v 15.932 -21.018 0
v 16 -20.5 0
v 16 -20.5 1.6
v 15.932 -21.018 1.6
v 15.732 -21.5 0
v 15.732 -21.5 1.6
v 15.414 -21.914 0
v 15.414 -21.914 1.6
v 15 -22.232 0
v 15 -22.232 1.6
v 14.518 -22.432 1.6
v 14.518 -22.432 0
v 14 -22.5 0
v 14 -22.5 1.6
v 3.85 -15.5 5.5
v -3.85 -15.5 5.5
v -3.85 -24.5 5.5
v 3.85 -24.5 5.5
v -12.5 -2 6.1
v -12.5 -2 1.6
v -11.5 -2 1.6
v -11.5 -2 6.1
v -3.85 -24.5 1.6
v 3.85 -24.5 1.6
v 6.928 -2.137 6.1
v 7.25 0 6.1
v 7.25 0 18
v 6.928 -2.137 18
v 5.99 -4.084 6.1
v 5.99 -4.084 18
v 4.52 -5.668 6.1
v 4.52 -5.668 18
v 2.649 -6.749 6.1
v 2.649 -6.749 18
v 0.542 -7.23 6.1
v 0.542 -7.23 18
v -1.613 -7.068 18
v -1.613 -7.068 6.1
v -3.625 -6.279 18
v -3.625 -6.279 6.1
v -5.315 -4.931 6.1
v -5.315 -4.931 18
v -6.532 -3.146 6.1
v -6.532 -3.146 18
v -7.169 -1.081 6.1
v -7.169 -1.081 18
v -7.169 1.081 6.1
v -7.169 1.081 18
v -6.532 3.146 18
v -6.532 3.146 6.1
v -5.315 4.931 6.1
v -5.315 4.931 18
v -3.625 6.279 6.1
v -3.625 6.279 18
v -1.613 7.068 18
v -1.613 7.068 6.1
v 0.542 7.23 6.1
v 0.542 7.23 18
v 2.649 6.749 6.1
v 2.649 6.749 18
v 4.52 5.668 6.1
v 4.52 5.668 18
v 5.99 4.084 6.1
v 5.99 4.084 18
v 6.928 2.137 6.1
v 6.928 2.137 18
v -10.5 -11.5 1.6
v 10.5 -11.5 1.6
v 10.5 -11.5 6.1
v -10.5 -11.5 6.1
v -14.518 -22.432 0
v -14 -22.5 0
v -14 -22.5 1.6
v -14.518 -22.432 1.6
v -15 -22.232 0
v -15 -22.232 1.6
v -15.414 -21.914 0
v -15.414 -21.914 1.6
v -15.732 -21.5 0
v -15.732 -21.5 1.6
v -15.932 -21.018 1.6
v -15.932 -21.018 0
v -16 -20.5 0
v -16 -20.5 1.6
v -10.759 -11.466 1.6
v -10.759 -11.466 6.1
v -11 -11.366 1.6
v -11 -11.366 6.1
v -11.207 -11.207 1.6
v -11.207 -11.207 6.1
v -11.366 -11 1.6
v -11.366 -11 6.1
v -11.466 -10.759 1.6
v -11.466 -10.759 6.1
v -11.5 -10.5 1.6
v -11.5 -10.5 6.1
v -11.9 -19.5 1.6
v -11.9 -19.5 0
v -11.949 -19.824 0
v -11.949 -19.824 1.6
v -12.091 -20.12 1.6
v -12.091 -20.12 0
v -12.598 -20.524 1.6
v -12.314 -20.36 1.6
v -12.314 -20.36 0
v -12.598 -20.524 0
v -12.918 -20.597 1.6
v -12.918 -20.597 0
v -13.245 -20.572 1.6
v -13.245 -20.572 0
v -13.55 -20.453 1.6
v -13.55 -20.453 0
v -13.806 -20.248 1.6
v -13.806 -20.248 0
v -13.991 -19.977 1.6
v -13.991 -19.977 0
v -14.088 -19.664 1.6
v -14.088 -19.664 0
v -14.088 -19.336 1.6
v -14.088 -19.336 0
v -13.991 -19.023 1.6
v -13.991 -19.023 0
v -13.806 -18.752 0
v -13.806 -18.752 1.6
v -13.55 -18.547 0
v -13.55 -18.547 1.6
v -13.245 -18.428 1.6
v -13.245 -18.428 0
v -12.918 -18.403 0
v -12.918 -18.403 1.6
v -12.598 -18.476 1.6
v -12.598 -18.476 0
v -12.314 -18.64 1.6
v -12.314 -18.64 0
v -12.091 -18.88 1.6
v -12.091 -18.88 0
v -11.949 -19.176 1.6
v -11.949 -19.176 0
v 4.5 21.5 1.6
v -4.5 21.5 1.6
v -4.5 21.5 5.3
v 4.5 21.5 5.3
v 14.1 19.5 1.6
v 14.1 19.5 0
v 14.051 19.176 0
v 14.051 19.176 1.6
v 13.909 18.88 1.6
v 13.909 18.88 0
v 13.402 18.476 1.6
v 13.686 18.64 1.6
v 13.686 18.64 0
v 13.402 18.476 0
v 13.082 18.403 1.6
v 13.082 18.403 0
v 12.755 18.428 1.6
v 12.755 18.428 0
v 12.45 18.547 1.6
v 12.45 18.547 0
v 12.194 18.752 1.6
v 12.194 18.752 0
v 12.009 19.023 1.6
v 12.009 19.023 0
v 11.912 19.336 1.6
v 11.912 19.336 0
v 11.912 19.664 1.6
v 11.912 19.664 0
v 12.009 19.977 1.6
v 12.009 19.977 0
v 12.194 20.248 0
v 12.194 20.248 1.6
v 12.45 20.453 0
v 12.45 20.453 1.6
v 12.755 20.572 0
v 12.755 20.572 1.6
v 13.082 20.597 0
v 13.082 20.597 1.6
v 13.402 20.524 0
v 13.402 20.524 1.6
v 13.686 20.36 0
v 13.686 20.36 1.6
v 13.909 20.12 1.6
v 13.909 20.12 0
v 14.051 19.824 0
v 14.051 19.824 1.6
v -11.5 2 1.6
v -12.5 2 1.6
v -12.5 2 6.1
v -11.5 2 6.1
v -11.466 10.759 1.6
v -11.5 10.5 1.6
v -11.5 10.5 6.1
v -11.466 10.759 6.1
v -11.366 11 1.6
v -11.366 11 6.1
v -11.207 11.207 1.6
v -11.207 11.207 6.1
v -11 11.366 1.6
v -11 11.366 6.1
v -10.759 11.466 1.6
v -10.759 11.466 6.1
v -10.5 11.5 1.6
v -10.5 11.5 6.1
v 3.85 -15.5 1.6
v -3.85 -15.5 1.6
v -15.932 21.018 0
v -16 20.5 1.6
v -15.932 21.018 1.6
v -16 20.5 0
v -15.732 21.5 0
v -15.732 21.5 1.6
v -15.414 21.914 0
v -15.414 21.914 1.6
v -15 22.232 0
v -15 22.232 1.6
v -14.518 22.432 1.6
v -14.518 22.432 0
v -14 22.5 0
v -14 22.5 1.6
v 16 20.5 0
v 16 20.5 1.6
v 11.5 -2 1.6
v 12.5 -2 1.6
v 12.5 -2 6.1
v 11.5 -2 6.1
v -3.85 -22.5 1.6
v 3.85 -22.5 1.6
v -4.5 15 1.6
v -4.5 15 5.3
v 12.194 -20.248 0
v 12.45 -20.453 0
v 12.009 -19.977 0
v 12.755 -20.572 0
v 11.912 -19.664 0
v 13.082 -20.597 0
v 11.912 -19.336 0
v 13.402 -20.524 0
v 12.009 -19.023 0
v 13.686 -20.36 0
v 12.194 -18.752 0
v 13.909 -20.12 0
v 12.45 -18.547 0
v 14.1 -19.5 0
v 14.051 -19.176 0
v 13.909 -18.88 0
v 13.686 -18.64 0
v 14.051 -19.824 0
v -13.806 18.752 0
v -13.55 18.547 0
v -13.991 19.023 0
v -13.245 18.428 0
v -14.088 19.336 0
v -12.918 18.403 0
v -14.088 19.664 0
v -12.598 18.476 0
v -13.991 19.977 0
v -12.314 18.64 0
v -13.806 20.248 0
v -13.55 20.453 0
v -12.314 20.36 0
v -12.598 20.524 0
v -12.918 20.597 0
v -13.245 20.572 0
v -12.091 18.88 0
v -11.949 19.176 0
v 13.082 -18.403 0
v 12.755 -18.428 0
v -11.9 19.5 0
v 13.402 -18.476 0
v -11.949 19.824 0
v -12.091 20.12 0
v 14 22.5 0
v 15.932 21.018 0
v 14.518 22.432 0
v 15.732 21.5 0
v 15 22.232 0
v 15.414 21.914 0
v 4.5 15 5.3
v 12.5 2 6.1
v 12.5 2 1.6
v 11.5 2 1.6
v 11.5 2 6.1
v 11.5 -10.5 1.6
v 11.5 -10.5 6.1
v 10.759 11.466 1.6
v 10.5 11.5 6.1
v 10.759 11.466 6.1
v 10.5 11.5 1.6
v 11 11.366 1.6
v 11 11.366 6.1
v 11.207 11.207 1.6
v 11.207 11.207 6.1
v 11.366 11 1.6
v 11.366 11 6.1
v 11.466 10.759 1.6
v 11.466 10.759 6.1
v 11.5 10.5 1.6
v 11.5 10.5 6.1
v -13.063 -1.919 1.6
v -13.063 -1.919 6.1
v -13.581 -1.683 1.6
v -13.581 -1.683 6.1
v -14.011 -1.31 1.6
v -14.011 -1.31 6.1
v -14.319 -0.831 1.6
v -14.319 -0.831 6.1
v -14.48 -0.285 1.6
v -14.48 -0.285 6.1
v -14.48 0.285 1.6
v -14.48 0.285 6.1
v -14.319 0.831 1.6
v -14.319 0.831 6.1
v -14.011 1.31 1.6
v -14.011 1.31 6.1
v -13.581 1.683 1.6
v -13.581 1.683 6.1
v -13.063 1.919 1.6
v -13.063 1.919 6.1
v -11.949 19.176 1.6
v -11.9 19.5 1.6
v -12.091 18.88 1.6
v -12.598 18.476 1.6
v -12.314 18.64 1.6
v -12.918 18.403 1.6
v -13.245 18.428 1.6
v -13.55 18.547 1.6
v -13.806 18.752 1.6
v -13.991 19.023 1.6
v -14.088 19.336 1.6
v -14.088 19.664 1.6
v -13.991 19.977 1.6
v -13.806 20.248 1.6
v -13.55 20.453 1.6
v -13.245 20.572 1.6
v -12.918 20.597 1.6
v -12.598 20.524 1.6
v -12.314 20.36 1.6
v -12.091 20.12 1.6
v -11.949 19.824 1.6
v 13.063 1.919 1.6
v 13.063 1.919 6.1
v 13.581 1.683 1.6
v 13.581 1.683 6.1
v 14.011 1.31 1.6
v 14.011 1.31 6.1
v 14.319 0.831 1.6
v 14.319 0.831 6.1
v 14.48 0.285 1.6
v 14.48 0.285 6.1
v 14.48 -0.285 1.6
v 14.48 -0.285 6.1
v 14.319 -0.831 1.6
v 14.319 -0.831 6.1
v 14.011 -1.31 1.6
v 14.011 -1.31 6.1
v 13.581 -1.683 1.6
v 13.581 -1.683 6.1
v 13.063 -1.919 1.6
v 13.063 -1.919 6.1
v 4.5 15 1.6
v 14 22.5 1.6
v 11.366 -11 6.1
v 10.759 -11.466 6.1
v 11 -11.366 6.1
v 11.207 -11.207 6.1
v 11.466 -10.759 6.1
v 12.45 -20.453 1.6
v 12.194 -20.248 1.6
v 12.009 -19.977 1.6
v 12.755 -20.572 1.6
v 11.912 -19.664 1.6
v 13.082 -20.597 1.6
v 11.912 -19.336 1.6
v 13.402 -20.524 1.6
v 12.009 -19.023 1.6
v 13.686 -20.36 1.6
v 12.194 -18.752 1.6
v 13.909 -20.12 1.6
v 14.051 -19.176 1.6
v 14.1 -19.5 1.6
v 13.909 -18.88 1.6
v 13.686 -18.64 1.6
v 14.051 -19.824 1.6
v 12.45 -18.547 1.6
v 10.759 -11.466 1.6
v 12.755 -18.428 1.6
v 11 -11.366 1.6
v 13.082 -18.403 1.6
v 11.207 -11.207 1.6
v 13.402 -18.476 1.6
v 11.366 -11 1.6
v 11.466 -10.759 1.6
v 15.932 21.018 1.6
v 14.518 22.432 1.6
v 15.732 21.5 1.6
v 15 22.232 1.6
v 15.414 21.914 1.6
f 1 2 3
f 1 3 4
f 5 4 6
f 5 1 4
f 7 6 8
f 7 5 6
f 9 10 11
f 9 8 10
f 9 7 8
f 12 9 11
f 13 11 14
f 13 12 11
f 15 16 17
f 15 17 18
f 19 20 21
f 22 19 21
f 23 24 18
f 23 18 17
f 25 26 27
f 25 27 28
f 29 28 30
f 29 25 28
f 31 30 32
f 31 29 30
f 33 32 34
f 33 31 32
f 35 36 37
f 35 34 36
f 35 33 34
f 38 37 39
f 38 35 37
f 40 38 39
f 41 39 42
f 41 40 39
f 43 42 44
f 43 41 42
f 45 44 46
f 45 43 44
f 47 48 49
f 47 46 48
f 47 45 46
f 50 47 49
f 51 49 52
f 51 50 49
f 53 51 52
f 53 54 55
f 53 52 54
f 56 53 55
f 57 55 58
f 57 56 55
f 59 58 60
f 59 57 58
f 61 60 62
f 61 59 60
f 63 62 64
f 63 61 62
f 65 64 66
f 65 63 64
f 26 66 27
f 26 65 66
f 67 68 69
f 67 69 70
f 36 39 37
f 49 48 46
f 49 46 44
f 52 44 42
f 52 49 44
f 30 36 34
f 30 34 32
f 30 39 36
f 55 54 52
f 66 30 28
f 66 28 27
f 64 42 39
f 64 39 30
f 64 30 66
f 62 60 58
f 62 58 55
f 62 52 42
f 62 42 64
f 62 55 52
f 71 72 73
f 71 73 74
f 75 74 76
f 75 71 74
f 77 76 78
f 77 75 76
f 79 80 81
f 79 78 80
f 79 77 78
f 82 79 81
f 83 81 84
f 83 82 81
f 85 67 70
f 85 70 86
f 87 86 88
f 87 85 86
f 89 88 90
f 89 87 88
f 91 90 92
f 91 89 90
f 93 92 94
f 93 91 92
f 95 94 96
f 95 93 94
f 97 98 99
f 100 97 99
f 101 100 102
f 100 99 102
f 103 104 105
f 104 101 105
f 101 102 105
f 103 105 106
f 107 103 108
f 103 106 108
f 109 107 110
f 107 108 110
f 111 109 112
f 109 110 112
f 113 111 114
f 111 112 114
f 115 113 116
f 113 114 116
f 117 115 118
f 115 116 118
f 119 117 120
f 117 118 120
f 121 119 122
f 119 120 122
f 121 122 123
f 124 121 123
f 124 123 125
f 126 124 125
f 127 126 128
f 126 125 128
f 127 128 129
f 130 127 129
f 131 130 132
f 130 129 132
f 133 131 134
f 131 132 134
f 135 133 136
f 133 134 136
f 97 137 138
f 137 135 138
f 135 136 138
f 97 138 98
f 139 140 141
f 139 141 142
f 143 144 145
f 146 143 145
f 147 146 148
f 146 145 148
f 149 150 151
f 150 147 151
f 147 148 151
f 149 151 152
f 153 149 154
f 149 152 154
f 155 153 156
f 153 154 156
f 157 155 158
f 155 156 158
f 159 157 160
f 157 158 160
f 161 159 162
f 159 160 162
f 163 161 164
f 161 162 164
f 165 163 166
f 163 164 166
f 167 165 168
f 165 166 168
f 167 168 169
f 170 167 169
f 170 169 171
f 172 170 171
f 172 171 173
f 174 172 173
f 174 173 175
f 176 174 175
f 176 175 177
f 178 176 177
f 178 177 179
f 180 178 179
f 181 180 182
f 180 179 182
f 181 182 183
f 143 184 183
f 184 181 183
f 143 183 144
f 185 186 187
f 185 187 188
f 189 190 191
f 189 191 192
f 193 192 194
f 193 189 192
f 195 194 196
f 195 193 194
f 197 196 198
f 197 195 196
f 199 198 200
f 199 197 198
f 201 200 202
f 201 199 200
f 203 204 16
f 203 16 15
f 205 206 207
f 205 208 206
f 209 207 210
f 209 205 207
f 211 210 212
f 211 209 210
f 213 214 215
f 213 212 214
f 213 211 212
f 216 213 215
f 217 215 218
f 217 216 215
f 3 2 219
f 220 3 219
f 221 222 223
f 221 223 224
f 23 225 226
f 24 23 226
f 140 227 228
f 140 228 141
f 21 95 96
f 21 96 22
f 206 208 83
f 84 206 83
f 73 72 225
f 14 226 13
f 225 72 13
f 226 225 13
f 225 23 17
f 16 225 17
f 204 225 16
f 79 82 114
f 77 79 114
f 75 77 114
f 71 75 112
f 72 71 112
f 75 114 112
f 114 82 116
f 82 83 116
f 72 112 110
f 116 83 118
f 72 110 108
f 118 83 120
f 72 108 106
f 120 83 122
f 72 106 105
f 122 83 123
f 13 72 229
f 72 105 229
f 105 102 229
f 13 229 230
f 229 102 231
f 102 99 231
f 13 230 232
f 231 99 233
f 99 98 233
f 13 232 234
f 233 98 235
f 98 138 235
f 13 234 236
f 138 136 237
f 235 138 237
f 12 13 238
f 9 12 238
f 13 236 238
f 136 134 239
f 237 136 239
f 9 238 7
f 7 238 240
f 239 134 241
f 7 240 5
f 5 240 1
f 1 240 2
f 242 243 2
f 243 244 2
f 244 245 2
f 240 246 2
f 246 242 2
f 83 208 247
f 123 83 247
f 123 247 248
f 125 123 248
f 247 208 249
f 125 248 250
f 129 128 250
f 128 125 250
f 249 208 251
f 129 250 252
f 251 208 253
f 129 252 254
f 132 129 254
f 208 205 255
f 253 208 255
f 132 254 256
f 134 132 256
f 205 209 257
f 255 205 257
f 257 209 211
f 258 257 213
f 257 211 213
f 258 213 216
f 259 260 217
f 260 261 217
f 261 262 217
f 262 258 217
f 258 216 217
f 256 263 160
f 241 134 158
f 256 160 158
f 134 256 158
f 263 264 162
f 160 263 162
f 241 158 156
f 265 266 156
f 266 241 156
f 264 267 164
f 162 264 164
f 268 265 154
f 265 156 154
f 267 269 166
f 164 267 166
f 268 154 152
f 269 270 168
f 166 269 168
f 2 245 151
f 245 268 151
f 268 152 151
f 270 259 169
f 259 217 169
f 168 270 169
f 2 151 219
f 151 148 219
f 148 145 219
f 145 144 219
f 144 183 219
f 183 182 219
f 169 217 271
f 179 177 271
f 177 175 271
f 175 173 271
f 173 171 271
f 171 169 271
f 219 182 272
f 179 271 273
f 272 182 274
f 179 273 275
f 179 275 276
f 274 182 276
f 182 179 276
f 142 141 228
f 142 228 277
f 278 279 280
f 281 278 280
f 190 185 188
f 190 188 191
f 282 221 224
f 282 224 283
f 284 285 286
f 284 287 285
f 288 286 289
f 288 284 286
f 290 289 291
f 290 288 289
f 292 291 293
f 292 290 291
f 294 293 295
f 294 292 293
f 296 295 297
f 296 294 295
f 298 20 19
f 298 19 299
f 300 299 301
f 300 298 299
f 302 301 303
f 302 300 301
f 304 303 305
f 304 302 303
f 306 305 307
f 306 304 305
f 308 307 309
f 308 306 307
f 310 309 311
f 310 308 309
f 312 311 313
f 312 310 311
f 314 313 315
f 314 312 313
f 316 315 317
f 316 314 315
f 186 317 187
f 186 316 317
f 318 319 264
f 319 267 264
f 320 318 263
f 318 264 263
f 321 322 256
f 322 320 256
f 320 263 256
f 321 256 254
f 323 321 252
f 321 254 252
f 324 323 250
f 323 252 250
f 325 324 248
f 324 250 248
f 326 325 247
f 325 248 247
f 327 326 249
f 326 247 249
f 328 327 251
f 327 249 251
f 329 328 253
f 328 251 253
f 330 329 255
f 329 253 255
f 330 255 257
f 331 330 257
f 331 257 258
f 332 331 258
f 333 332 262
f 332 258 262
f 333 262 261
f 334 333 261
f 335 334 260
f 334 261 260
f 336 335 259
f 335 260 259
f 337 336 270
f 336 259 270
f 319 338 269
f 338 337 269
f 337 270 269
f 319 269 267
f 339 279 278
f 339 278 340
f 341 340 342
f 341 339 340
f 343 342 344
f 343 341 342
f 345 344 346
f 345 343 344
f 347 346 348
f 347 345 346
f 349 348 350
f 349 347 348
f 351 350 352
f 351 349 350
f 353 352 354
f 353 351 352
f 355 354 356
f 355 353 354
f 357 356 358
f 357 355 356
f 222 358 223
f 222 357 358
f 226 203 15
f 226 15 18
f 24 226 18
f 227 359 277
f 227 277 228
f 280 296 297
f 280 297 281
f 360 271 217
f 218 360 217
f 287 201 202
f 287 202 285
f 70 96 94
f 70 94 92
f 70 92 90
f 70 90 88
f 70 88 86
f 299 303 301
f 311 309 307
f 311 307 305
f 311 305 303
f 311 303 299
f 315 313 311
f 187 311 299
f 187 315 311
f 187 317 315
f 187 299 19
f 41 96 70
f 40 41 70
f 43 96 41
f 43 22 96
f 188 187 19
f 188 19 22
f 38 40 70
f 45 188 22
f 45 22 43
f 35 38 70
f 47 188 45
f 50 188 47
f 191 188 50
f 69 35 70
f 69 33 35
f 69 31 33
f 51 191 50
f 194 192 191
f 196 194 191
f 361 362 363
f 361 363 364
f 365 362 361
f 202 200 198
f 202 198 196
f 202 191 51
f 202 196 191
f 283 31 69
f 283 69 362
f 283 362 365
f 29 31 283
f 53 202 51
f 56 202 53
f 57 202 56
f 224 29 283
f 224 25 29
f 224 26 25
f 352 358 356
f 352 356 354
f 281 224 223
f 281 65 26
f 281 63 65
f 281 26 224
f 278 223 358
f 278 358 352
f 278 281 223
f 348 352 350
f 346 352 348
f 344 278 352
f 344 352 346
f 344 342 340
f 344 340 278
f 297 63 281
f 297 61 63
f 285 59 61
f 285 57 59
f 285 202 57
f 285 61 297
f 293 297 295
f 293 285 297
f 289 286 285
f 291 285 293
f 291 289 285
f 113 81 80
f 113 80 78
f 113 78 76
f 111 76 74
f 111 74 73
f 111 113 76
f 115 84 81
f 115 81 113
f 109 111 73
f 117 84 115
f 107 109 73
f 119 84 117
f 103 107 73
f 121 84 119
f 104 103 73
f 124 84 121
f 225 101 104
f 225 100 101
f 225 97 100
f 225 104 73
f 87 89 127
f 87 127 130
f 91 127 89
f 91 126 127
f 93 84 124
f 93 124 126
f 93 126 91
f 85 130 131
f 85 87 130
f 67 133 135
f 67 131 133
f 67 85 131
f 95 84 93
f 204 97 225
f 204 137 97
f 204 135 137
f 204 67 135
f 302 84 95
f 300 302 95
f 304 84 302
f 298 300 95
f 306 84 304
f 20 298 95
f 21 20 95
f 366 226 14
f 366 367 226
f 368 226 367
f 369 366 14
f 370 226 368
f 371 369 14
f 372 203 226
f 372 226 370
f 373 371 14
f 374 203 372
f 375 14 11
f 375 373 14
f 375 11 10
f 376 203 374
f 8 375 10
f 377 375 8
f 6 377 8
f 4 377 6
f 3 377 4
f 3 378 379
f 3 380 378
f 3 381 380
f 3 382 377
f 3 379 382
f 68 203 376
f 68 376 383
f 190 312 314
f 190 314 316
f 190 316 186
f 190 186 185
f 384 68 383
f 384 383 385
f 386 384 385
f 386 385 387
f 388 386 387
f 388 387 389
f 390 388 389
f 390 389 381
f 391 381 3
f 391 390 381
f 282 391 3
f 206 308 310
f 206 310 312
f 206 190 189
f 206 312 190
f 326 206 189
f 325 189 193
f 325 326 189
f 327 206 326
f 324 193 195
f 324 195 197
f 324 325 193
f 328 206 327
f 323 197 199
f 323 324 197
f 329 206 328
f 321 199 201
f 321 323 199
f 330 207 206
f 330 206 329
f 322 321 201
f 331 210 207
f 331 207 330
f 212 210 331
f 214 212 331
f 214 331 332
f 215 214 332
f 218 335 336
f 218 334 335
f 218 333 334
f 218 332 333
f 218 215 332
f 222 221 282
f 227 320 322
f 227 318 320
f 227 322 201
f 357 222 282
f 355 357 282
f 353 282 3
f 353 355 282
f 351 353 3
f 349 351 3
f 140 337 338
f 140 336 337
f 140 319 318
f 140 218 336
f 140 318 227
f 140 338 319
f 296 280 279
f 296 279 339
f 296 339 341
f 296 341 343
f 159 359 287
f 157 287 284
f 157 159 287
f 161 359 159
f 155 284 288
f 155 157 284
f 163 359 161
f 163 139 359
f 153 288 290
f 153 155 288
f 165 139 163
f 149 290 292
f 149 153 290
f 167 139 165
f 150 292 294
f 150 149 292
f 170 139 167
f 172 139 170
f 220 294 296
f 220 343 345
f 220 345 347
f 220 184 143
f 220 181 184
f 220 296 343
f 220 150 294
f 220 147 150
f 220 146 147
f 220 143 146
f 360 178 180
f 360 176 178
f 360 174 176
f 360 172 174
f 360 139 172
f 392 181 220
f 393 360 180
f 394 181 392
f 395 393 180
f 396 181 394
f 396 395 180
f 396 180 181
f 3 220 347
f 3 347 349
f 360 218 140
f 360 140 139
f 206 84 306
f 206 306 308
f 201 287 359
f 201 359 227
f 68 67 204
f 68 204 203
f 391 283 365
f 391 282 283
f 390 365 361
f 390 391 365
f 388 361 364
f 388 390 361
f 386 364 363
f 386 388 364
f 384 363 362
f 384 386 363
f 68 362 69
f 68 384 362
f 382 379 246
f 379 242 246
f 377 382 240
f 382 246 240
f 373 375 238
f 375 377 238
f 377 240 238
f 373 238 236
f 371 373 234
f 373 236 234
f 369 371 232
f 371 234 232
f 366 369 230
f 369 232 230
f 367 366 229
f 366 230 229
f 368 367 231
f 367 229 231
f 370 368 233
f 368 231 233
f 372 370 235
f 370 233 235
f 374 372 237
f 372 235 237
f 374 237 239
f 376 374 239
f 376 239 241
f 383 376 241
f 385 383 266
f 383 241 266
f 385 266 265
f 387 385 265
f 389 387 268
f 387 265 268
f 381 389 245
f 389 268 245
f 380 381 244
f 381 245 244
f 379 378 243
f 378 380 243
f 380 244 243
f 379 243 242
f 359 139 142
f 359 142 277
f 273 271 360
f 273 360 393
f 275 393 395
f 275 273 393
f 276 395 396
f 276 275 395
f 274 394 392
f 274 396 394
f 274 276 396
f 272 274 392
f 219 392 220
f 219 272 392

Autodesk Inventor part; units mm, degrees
ref_plane "YZ Plane" through (0, 0, 0) normal (1, 0, 0) x (0, 1, 0)
ref_plane "XZ Plane" through (0, 0, 0) normal (0, 1, 0) x (-1, 0, 0)
ref_plane "XY Plane" through (0, 0, 0) normal (0, 0, 1) x (1, 0, 0)
sketch "スケッチ1" plane through (0, 0, 0) normal (0, 0, 1) x (1, 0, 0)
  line L0 (14, 22.5) -> (-14, 22.5)
  line L1 (-16, 20.5) -> (-16, -20.5)
  line L2 (-14, -22.5) -> (14, -22.5)
  line L3 (16, -20.5) -> (16, 20.5)
  line L4 (16, 22.5) -> (-16, -22.5) construction
  line L5 (-16, 22.5) -> (16, -22.5) construction
  line L6 (-13, 19.5) -> (13, 19.5) construction
  line L7 (13, 19.5) -> (13, -19.5) construction
  line L8 (13, -19.5) -> (-13, -19.5) construction
  line L9 (-13, -19.5) -> (-13, 19.5) construction
  line L10 (-13, 19.5) -> (13, -19.5) construction
  line L11 (13, 19.5) -> (-13, -19.5) construction
  circle A0 centre (-13, -19.5) radius 1.1
  line L12 (-16, 0) -> (16, 0) construction
  line L13 (0, 22.5) -> (0, -22.5) construction
  circle A1 centre (-13, 19.5) radius 1.1
  circle A2 centre (13, -19.5) radius 1.1
  circle A3 centre (13, 19.5) radius 1.1
  circle A4 centre (-13, -19.5) radius 2 construction
  circle A5 centre (-13, 19.5) radius 2 construction
  circle A6 centre (13, -19.5) radius 2 construction
  circle A7 centre (13, 19.5) radius 2 construction
  circle A8 centre (0, 0) radius 7.25
  arc A9 (-16, -20.5) -> (-14, -22.5) centre (-14, -20.5) ccw
  arc A10 (14, -22.5) -> (16, -20.5) centre (14, -20.5) ccw
  arc A11 (16, 20.5) -> (14, 22.5) centre (14, 20.5) ccw
  arc A12 (-14, 22.5) -> (-16, 20.5) centre (-14, 20.5) ccw
  line L14 (-10.5, 11.5) -> (10.5, 11.5)
  line L15 (11.5, 10.5) -> (11.5, -10.5)
  line L16 (10.5, -11.5) -> (-10.5, -11.5)
  line L17 (-11.5, -10.5) -> (-11.5, 10.5)
  line L18 (-11.5, 11.5) -> (11.5, -11.5) construction
  line L19 (11.5, 11.5) -> (-11.5, -11.5) construction
  line L20 (3.85, -24.5) -> (-3.85, -24.5)
  line L21 (-3.85, -24.5) -> (-3.85, -15.5)
  line L22 (-3.85, -15.5) -> (3.85, -15.5)
  line L23 (3.85, -15.5) -> (3.85, -24.5)
  line L24 (3.85, -24.5) -> (-3.85, -15.5) construction
  line L25 (-3.85, -24.5) -> (3.85, -15.5) construction
  line L26 (-4.5, 21.5) -> (4.5, 21.5)
  line L27 (4.5, 21.5) -> (4.5, 15)
  line L28 (4.5, 15) -> (-4.5, 15)
  line L29 (-4.5, 15) -> (-4.5, 21.5)
  line L30 (-4.5, 21.5) -> (4.5, 15) construction
  line L31 (4.5, 21.5) -> (-4.5, 15) construction
  arc A13 (-10.5, 11.5) -> (-11.5, 10.5) centre (-10.5, 10.5) ccw
  arc A14 (-11.5, -10.5) -> (-10.5, -11.5) centre (-10.5, -10.5) ccw
  arc A15 (10.5, -11.5) -> (11.5, -10.5) centre (10.5, -10.5) ccw
  arc A16 (11.5, 10.5) -> (10.5, 11.5) centre (10.5, 10.5) ccw
  arc A17 (-12.5, 2) -> (-12.5, -2) centre (-12.5, 0) ccw
  line L32 (-12.5, 2) -> (-11.5, 2)
  line L33 (-12.5, -2) -> (-11.5, -2)
  arc A18 (12.5, -2) -> (12.5, 2) centre (12.5, 0) ccw
  line L34 (12.5, 2) -> (11.5, 2)
  line L35 (12.5, -2) -> (11.5, -2)
  point P0 (0, -20)
  point P1 (0, 18.25)
  point P2 (3.85, -22.5)
  point P3 (-3.85, -22.5)
  dimension "d0" = 32
  dimension "d1" = 45
  dimension "d5" = 2.2
  dimension "d6" = 4
  dimension "d34" = 2
  dimension "d40" = 26
  dimension "d41" = 39
  dimension "d42" = 14.5
  dimension "d43" = 23
  dimension "d44" = 23
  dimension "d45" = 7.7
  dimension "d46" = 9
  dimension "d47" = 2
  dimension "d48" = 9
  dimension "d49" = 6.5
  dimension "d50" = 1
  dimension "d57" = 1
  dimension "d58" = 2
  dimension "d59" = 1
extrude "押し出し1" add sketch "スケッチ1" along normal blind 1.6 contours A11 L3 A10 L2 L23 L22 L21 A9 L1 A12 L0 | L2 L21 L22 L23 | A8 | L14 A16 L15 A15 L16 A14 L17 A13 | L17 L33 A17 L32 | L34 A18 L35 L15 | L26 L27 L28 L29
extrude "押し出し2" add sketch "スケッチ1" along normal blind 6.1 contours L14 A16 L15 A15 L16 A14 L17 A13 | L17 L33 A17 L32 | L34 A18 L35 L15
extrude "押し出し3" add sketch "スケッチ1" along normal blind 18 contours A8
extrude "押し出し4" add sketch "スケッチ1" along normal blind 5.5 contours L23 L20 L21 L2 | L2 L21 L22 L23
extrude "押し出し5" cut sketch "スケッチ1" along normal blind 1.6 contours L23 L20 L21 L2
extrude "押し出し6" add sketch "スケッチ1" along normal blind 5.3 contours L26 L27 L28 L29
properties part number "KBCR-S02MU"
